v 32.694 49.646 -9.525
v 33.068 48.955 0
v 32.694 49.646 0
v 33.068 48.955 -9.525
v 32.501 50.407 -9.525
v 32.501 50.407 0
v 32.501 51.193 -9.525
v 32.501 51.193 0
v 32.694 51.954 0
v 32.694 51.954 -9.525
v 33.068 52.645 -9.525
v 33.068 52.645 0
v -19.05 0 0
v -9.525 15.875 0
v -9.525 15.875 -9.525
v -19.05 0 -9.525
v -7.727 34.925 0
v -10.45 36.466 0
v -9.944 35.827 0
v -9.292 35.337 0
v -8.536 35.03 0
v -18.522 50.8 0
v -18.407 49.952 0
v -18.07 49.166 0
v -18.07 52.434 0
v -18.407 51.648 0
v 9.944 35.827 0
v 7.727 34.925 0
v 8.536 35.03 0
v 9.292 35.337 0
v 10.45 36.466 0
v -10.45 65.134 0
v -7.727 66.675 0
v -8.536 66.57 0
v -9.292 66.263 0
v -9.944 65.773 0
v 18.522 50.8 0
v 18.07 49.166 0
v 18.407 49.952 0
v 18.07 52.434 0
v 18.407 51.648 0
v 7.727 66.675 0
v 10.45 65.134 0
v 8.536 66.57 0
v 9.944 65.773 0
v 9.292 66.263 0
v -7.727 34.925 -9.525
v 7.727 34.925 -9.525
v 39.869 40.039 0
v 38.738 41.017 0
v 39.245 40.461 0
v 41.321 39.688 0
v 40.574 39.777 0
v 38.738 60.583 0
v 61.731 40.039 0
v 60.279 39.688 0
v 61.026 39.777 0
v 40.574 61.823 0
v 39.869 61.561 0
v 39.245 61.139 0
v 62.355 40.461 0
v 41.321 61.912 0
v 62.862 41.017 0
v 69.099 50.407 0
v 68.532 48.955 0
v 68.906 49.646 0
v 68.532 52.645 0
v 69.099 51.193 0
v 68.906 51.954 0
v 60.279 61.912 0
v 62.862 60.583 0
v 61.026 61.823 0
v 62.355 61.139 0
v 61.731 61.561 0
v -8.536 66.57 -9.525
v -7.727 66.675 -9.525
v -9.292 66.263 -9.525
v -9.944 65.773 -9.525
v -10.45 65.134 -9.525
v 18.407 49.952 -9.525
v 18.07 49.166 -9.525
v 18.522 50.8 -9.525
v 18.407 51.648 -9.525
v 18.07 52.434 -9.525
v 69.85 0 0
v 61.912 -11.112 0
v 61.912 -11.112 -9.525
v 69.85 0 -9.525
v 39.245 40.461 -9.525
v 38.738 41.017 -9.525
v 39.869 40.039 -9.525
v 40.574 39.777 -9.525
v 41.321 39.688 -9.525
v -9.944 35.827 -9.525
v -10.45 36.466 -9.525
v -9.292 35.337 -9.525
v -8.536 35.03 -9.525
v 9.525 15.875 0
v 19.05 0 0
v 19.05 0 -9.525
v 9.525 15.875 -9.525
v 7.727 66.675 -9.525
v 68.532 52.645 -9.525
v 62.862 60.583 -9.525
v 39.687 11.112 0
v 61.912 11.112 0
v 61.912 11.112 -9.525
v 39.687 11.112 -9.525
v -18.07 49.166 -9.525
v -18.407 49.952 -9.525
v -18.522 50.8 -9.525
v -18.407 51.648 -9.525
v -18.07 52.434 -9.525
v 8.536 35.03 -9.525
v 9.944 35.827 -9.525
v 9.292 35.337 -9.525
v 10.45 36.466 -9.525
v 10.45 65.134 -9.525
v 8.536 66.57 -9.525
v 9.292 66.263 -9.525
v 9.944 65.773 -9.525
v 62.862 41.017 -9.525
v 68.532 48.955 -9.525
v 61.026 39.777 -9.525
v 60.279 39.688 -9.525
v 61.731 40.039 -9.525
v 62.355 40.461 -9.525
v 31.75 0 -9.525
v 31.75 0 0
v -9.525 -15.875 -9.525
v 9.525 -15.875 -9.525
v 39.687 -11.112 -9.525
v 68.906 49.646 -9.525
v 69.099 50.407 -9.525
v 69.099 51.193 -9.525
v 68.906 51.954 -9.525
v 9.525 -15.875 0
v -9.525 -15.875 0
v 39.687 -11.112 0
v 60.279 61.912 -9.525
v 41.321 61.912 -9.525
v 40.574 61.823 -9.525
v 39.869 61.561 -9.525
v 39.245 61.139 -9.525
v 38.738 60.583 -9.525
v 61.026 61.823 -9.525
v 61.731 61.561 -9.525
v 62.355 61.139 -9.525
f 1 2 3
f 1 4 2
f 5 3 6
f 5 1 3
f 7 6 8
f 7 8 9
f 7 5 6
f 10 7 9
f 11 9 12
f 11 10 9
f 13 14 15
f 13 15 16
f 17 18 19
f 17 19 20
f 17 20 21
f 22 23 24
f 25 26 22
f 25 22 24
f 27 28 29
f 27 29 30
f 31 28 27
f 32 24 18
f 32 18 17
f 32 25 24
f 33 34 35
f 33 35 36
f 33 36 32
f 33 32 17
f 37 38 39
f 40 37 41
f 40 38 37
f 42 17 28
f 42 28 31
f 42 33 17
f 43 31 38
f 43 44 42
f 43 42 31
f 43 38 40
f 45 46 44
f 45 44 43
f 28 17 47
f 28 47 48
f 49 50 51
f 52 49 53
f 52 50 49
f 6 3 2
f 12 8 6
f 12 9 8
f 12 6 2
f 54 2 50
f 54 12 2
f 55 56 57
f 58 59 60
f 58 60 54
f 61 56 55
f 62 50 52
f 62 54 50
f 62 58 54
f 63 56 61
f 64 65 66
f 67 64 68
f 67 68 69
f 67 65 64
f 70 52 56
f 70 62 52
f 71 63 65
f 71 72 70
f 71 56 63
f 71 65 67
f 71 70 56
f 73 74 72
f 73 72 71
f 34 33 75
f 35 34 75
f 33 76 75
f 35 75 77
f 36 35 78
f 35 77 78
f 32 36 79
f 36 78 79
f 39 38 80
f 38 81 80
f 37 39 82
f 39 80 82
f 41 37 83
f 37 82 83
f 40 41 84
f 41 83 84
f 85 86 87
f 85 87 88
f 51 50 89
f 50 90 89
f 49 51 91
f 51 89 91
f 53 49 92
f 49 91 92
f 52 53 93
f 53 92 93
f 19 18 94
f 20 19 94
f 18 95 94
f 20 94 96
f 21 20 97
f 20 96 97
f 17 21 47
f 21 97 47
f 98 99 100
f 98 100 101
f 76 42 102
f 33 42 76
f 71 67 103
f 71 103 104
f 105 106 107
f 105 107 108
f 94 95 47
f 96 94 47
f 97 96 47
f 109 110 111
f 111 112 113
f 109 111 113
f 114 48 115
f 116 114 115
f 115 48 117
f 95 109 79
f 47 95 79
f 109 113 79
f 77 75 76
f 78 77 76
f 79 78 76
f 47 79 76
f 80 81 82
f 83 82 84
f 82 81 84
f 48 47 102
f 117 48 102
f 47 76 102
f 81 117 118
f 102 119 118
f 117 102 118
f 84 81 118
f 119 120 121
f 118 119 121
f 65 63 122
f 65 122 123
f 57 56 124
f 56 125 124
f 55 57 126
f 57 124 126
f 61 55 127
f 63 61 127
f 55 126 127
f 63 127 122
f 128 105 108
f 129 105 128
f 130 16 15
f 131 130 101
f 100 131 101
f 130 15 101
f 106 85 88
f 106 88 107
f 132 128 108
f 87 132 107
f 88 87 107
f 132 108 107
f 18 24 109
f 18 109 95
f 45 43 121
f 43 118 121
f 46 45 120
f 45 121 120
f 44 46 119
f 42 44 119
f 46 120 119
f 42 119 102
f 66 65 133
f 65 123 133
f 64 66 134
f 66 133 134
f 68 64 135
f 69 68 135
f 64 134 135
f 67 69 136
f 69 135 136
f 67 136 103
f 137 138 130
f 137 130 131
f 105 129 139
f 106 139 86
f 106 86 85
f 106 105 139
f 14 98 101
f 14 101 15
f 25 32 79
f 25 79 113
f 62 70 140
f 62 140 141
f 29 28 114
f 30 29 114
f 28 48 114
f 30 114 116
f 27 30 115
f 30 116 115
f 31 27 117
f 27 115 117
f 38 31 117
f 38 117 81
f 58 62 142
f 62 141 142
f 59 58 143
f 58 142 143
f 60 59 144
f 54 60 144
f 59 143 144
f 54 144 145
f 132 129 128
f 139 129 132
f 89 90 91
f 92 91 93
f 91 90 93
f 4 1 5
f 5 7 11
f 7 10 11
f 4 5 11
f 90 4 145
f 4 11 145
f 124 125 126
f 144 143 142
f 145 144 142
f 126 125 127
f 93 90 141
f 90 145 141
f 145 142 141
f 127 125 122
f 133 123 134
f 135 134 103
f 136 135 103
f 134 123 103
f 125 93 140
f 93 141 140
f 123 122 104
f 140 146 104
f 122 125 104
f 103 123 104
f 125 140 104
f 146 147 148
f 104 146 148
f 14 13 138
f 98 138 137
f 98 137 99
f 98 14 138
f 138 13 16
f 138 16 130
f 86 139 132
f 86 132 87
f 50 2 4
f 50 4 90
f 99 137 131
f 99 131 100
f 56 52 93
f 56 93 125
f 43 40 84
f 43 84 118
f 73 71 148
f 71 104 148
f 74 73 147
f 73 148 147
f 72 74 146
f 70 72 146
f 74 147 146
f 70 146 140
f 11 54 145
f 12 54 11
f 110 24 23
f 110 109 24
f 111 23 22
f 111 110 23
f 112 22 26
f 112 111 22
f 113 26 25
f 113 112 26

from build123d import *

# Parameters (mm, degrees)
F1_DEPTH = 9.525
F2_R     = 3.175
F2_2_R   = 3.175


# Not quite as in the source:
# - a feature names something its author has since deleted; it is built from what else it names


with BuildPart() as f1:
    # F0 (on Top) → F1 (new body)
    with BuildSketch(Plane.XY):
        Polygon((-19.05, 50.8), (-9.525, 34.925), (9.525, 34.925), (19.05, 50.8), (9.525, 66.675), (-9.525, 66.675), align=None)
    extrude(amount=-F1_DEPTH)

    # F2
    f2_edges = [f1.edges().sort_by_distance(p)[0] for p in [
        (-19.05, 50.8, -4.7625),
        (-9.525, 34.925, -4.7625),
        (19.05, 50.8, -4.7625),
        (9.525, 34.925, -4.7625),
        (9.525, 66.675, -4.7625),
        (-9.525, 66.675, -4.7625),
    ]]
    fillet(f2_edges, radius=F2_R)


with BuildPart() as f1b:
    # F0 (on Top) → F1, piece 2 (new body)
    with BuildSketch(Plane.XY):
        Polygon((31.7499993861, 50.8), (39.6874993861, 39.6875), (61.9124993861, 39.6875), (69.8499993861, 50.8), (61.9124993861, 61.9125), (39.6874993861, 61.9125), align=None)
    extrude(amount=-F1_DEPTH)

    # F2#2
    f2_2_edges = [f1b.edges().sort_by_distance(p)[0] for p in [
        (31.749999, 50.8, -4.7625),
        (39.687499, 61.9125, -4.7625),
        (61.912499, 61.9125, -4.7625),
        (69.849999, 50.8, -4.7625),
        (61.912499, 39.6875, -4.7625),
        (39.687499, 39.6875, -4.7625),
    ]]
    fillet(f2_2_edges, radius=F2_2_R)


with BuildPart() as f1c:
    # F0 (on Top) → F1, piece 3 (new body)
    with BuildSketch(Plane.XY):
        Polygon((-19.05, 0), (-9.525, -15.875), (9.525, -15.875), (19.05, 0), (9.525, 15.875), (-9.525, 15.875), align=None)
    extrude(amount=-F1_DEPTH)


with BuildPart() as f1d:
    # F0 (on Top) → F1, piece 4 (new body)
    with BuildSketch(Plane.XY):
        Polygon((31.7499993861, 0), (39.6874993861, -11.1125), (61.9124993861, -11.1125), (69.8499993861, 0), (61.9124993861, 11.1125), (39.6874993861, 11.1125), align=None)
    extrude(amount=-F1_DEPTH)


solid = Compound([f1.part, f1b.part, f1c.part, f1d.part])
